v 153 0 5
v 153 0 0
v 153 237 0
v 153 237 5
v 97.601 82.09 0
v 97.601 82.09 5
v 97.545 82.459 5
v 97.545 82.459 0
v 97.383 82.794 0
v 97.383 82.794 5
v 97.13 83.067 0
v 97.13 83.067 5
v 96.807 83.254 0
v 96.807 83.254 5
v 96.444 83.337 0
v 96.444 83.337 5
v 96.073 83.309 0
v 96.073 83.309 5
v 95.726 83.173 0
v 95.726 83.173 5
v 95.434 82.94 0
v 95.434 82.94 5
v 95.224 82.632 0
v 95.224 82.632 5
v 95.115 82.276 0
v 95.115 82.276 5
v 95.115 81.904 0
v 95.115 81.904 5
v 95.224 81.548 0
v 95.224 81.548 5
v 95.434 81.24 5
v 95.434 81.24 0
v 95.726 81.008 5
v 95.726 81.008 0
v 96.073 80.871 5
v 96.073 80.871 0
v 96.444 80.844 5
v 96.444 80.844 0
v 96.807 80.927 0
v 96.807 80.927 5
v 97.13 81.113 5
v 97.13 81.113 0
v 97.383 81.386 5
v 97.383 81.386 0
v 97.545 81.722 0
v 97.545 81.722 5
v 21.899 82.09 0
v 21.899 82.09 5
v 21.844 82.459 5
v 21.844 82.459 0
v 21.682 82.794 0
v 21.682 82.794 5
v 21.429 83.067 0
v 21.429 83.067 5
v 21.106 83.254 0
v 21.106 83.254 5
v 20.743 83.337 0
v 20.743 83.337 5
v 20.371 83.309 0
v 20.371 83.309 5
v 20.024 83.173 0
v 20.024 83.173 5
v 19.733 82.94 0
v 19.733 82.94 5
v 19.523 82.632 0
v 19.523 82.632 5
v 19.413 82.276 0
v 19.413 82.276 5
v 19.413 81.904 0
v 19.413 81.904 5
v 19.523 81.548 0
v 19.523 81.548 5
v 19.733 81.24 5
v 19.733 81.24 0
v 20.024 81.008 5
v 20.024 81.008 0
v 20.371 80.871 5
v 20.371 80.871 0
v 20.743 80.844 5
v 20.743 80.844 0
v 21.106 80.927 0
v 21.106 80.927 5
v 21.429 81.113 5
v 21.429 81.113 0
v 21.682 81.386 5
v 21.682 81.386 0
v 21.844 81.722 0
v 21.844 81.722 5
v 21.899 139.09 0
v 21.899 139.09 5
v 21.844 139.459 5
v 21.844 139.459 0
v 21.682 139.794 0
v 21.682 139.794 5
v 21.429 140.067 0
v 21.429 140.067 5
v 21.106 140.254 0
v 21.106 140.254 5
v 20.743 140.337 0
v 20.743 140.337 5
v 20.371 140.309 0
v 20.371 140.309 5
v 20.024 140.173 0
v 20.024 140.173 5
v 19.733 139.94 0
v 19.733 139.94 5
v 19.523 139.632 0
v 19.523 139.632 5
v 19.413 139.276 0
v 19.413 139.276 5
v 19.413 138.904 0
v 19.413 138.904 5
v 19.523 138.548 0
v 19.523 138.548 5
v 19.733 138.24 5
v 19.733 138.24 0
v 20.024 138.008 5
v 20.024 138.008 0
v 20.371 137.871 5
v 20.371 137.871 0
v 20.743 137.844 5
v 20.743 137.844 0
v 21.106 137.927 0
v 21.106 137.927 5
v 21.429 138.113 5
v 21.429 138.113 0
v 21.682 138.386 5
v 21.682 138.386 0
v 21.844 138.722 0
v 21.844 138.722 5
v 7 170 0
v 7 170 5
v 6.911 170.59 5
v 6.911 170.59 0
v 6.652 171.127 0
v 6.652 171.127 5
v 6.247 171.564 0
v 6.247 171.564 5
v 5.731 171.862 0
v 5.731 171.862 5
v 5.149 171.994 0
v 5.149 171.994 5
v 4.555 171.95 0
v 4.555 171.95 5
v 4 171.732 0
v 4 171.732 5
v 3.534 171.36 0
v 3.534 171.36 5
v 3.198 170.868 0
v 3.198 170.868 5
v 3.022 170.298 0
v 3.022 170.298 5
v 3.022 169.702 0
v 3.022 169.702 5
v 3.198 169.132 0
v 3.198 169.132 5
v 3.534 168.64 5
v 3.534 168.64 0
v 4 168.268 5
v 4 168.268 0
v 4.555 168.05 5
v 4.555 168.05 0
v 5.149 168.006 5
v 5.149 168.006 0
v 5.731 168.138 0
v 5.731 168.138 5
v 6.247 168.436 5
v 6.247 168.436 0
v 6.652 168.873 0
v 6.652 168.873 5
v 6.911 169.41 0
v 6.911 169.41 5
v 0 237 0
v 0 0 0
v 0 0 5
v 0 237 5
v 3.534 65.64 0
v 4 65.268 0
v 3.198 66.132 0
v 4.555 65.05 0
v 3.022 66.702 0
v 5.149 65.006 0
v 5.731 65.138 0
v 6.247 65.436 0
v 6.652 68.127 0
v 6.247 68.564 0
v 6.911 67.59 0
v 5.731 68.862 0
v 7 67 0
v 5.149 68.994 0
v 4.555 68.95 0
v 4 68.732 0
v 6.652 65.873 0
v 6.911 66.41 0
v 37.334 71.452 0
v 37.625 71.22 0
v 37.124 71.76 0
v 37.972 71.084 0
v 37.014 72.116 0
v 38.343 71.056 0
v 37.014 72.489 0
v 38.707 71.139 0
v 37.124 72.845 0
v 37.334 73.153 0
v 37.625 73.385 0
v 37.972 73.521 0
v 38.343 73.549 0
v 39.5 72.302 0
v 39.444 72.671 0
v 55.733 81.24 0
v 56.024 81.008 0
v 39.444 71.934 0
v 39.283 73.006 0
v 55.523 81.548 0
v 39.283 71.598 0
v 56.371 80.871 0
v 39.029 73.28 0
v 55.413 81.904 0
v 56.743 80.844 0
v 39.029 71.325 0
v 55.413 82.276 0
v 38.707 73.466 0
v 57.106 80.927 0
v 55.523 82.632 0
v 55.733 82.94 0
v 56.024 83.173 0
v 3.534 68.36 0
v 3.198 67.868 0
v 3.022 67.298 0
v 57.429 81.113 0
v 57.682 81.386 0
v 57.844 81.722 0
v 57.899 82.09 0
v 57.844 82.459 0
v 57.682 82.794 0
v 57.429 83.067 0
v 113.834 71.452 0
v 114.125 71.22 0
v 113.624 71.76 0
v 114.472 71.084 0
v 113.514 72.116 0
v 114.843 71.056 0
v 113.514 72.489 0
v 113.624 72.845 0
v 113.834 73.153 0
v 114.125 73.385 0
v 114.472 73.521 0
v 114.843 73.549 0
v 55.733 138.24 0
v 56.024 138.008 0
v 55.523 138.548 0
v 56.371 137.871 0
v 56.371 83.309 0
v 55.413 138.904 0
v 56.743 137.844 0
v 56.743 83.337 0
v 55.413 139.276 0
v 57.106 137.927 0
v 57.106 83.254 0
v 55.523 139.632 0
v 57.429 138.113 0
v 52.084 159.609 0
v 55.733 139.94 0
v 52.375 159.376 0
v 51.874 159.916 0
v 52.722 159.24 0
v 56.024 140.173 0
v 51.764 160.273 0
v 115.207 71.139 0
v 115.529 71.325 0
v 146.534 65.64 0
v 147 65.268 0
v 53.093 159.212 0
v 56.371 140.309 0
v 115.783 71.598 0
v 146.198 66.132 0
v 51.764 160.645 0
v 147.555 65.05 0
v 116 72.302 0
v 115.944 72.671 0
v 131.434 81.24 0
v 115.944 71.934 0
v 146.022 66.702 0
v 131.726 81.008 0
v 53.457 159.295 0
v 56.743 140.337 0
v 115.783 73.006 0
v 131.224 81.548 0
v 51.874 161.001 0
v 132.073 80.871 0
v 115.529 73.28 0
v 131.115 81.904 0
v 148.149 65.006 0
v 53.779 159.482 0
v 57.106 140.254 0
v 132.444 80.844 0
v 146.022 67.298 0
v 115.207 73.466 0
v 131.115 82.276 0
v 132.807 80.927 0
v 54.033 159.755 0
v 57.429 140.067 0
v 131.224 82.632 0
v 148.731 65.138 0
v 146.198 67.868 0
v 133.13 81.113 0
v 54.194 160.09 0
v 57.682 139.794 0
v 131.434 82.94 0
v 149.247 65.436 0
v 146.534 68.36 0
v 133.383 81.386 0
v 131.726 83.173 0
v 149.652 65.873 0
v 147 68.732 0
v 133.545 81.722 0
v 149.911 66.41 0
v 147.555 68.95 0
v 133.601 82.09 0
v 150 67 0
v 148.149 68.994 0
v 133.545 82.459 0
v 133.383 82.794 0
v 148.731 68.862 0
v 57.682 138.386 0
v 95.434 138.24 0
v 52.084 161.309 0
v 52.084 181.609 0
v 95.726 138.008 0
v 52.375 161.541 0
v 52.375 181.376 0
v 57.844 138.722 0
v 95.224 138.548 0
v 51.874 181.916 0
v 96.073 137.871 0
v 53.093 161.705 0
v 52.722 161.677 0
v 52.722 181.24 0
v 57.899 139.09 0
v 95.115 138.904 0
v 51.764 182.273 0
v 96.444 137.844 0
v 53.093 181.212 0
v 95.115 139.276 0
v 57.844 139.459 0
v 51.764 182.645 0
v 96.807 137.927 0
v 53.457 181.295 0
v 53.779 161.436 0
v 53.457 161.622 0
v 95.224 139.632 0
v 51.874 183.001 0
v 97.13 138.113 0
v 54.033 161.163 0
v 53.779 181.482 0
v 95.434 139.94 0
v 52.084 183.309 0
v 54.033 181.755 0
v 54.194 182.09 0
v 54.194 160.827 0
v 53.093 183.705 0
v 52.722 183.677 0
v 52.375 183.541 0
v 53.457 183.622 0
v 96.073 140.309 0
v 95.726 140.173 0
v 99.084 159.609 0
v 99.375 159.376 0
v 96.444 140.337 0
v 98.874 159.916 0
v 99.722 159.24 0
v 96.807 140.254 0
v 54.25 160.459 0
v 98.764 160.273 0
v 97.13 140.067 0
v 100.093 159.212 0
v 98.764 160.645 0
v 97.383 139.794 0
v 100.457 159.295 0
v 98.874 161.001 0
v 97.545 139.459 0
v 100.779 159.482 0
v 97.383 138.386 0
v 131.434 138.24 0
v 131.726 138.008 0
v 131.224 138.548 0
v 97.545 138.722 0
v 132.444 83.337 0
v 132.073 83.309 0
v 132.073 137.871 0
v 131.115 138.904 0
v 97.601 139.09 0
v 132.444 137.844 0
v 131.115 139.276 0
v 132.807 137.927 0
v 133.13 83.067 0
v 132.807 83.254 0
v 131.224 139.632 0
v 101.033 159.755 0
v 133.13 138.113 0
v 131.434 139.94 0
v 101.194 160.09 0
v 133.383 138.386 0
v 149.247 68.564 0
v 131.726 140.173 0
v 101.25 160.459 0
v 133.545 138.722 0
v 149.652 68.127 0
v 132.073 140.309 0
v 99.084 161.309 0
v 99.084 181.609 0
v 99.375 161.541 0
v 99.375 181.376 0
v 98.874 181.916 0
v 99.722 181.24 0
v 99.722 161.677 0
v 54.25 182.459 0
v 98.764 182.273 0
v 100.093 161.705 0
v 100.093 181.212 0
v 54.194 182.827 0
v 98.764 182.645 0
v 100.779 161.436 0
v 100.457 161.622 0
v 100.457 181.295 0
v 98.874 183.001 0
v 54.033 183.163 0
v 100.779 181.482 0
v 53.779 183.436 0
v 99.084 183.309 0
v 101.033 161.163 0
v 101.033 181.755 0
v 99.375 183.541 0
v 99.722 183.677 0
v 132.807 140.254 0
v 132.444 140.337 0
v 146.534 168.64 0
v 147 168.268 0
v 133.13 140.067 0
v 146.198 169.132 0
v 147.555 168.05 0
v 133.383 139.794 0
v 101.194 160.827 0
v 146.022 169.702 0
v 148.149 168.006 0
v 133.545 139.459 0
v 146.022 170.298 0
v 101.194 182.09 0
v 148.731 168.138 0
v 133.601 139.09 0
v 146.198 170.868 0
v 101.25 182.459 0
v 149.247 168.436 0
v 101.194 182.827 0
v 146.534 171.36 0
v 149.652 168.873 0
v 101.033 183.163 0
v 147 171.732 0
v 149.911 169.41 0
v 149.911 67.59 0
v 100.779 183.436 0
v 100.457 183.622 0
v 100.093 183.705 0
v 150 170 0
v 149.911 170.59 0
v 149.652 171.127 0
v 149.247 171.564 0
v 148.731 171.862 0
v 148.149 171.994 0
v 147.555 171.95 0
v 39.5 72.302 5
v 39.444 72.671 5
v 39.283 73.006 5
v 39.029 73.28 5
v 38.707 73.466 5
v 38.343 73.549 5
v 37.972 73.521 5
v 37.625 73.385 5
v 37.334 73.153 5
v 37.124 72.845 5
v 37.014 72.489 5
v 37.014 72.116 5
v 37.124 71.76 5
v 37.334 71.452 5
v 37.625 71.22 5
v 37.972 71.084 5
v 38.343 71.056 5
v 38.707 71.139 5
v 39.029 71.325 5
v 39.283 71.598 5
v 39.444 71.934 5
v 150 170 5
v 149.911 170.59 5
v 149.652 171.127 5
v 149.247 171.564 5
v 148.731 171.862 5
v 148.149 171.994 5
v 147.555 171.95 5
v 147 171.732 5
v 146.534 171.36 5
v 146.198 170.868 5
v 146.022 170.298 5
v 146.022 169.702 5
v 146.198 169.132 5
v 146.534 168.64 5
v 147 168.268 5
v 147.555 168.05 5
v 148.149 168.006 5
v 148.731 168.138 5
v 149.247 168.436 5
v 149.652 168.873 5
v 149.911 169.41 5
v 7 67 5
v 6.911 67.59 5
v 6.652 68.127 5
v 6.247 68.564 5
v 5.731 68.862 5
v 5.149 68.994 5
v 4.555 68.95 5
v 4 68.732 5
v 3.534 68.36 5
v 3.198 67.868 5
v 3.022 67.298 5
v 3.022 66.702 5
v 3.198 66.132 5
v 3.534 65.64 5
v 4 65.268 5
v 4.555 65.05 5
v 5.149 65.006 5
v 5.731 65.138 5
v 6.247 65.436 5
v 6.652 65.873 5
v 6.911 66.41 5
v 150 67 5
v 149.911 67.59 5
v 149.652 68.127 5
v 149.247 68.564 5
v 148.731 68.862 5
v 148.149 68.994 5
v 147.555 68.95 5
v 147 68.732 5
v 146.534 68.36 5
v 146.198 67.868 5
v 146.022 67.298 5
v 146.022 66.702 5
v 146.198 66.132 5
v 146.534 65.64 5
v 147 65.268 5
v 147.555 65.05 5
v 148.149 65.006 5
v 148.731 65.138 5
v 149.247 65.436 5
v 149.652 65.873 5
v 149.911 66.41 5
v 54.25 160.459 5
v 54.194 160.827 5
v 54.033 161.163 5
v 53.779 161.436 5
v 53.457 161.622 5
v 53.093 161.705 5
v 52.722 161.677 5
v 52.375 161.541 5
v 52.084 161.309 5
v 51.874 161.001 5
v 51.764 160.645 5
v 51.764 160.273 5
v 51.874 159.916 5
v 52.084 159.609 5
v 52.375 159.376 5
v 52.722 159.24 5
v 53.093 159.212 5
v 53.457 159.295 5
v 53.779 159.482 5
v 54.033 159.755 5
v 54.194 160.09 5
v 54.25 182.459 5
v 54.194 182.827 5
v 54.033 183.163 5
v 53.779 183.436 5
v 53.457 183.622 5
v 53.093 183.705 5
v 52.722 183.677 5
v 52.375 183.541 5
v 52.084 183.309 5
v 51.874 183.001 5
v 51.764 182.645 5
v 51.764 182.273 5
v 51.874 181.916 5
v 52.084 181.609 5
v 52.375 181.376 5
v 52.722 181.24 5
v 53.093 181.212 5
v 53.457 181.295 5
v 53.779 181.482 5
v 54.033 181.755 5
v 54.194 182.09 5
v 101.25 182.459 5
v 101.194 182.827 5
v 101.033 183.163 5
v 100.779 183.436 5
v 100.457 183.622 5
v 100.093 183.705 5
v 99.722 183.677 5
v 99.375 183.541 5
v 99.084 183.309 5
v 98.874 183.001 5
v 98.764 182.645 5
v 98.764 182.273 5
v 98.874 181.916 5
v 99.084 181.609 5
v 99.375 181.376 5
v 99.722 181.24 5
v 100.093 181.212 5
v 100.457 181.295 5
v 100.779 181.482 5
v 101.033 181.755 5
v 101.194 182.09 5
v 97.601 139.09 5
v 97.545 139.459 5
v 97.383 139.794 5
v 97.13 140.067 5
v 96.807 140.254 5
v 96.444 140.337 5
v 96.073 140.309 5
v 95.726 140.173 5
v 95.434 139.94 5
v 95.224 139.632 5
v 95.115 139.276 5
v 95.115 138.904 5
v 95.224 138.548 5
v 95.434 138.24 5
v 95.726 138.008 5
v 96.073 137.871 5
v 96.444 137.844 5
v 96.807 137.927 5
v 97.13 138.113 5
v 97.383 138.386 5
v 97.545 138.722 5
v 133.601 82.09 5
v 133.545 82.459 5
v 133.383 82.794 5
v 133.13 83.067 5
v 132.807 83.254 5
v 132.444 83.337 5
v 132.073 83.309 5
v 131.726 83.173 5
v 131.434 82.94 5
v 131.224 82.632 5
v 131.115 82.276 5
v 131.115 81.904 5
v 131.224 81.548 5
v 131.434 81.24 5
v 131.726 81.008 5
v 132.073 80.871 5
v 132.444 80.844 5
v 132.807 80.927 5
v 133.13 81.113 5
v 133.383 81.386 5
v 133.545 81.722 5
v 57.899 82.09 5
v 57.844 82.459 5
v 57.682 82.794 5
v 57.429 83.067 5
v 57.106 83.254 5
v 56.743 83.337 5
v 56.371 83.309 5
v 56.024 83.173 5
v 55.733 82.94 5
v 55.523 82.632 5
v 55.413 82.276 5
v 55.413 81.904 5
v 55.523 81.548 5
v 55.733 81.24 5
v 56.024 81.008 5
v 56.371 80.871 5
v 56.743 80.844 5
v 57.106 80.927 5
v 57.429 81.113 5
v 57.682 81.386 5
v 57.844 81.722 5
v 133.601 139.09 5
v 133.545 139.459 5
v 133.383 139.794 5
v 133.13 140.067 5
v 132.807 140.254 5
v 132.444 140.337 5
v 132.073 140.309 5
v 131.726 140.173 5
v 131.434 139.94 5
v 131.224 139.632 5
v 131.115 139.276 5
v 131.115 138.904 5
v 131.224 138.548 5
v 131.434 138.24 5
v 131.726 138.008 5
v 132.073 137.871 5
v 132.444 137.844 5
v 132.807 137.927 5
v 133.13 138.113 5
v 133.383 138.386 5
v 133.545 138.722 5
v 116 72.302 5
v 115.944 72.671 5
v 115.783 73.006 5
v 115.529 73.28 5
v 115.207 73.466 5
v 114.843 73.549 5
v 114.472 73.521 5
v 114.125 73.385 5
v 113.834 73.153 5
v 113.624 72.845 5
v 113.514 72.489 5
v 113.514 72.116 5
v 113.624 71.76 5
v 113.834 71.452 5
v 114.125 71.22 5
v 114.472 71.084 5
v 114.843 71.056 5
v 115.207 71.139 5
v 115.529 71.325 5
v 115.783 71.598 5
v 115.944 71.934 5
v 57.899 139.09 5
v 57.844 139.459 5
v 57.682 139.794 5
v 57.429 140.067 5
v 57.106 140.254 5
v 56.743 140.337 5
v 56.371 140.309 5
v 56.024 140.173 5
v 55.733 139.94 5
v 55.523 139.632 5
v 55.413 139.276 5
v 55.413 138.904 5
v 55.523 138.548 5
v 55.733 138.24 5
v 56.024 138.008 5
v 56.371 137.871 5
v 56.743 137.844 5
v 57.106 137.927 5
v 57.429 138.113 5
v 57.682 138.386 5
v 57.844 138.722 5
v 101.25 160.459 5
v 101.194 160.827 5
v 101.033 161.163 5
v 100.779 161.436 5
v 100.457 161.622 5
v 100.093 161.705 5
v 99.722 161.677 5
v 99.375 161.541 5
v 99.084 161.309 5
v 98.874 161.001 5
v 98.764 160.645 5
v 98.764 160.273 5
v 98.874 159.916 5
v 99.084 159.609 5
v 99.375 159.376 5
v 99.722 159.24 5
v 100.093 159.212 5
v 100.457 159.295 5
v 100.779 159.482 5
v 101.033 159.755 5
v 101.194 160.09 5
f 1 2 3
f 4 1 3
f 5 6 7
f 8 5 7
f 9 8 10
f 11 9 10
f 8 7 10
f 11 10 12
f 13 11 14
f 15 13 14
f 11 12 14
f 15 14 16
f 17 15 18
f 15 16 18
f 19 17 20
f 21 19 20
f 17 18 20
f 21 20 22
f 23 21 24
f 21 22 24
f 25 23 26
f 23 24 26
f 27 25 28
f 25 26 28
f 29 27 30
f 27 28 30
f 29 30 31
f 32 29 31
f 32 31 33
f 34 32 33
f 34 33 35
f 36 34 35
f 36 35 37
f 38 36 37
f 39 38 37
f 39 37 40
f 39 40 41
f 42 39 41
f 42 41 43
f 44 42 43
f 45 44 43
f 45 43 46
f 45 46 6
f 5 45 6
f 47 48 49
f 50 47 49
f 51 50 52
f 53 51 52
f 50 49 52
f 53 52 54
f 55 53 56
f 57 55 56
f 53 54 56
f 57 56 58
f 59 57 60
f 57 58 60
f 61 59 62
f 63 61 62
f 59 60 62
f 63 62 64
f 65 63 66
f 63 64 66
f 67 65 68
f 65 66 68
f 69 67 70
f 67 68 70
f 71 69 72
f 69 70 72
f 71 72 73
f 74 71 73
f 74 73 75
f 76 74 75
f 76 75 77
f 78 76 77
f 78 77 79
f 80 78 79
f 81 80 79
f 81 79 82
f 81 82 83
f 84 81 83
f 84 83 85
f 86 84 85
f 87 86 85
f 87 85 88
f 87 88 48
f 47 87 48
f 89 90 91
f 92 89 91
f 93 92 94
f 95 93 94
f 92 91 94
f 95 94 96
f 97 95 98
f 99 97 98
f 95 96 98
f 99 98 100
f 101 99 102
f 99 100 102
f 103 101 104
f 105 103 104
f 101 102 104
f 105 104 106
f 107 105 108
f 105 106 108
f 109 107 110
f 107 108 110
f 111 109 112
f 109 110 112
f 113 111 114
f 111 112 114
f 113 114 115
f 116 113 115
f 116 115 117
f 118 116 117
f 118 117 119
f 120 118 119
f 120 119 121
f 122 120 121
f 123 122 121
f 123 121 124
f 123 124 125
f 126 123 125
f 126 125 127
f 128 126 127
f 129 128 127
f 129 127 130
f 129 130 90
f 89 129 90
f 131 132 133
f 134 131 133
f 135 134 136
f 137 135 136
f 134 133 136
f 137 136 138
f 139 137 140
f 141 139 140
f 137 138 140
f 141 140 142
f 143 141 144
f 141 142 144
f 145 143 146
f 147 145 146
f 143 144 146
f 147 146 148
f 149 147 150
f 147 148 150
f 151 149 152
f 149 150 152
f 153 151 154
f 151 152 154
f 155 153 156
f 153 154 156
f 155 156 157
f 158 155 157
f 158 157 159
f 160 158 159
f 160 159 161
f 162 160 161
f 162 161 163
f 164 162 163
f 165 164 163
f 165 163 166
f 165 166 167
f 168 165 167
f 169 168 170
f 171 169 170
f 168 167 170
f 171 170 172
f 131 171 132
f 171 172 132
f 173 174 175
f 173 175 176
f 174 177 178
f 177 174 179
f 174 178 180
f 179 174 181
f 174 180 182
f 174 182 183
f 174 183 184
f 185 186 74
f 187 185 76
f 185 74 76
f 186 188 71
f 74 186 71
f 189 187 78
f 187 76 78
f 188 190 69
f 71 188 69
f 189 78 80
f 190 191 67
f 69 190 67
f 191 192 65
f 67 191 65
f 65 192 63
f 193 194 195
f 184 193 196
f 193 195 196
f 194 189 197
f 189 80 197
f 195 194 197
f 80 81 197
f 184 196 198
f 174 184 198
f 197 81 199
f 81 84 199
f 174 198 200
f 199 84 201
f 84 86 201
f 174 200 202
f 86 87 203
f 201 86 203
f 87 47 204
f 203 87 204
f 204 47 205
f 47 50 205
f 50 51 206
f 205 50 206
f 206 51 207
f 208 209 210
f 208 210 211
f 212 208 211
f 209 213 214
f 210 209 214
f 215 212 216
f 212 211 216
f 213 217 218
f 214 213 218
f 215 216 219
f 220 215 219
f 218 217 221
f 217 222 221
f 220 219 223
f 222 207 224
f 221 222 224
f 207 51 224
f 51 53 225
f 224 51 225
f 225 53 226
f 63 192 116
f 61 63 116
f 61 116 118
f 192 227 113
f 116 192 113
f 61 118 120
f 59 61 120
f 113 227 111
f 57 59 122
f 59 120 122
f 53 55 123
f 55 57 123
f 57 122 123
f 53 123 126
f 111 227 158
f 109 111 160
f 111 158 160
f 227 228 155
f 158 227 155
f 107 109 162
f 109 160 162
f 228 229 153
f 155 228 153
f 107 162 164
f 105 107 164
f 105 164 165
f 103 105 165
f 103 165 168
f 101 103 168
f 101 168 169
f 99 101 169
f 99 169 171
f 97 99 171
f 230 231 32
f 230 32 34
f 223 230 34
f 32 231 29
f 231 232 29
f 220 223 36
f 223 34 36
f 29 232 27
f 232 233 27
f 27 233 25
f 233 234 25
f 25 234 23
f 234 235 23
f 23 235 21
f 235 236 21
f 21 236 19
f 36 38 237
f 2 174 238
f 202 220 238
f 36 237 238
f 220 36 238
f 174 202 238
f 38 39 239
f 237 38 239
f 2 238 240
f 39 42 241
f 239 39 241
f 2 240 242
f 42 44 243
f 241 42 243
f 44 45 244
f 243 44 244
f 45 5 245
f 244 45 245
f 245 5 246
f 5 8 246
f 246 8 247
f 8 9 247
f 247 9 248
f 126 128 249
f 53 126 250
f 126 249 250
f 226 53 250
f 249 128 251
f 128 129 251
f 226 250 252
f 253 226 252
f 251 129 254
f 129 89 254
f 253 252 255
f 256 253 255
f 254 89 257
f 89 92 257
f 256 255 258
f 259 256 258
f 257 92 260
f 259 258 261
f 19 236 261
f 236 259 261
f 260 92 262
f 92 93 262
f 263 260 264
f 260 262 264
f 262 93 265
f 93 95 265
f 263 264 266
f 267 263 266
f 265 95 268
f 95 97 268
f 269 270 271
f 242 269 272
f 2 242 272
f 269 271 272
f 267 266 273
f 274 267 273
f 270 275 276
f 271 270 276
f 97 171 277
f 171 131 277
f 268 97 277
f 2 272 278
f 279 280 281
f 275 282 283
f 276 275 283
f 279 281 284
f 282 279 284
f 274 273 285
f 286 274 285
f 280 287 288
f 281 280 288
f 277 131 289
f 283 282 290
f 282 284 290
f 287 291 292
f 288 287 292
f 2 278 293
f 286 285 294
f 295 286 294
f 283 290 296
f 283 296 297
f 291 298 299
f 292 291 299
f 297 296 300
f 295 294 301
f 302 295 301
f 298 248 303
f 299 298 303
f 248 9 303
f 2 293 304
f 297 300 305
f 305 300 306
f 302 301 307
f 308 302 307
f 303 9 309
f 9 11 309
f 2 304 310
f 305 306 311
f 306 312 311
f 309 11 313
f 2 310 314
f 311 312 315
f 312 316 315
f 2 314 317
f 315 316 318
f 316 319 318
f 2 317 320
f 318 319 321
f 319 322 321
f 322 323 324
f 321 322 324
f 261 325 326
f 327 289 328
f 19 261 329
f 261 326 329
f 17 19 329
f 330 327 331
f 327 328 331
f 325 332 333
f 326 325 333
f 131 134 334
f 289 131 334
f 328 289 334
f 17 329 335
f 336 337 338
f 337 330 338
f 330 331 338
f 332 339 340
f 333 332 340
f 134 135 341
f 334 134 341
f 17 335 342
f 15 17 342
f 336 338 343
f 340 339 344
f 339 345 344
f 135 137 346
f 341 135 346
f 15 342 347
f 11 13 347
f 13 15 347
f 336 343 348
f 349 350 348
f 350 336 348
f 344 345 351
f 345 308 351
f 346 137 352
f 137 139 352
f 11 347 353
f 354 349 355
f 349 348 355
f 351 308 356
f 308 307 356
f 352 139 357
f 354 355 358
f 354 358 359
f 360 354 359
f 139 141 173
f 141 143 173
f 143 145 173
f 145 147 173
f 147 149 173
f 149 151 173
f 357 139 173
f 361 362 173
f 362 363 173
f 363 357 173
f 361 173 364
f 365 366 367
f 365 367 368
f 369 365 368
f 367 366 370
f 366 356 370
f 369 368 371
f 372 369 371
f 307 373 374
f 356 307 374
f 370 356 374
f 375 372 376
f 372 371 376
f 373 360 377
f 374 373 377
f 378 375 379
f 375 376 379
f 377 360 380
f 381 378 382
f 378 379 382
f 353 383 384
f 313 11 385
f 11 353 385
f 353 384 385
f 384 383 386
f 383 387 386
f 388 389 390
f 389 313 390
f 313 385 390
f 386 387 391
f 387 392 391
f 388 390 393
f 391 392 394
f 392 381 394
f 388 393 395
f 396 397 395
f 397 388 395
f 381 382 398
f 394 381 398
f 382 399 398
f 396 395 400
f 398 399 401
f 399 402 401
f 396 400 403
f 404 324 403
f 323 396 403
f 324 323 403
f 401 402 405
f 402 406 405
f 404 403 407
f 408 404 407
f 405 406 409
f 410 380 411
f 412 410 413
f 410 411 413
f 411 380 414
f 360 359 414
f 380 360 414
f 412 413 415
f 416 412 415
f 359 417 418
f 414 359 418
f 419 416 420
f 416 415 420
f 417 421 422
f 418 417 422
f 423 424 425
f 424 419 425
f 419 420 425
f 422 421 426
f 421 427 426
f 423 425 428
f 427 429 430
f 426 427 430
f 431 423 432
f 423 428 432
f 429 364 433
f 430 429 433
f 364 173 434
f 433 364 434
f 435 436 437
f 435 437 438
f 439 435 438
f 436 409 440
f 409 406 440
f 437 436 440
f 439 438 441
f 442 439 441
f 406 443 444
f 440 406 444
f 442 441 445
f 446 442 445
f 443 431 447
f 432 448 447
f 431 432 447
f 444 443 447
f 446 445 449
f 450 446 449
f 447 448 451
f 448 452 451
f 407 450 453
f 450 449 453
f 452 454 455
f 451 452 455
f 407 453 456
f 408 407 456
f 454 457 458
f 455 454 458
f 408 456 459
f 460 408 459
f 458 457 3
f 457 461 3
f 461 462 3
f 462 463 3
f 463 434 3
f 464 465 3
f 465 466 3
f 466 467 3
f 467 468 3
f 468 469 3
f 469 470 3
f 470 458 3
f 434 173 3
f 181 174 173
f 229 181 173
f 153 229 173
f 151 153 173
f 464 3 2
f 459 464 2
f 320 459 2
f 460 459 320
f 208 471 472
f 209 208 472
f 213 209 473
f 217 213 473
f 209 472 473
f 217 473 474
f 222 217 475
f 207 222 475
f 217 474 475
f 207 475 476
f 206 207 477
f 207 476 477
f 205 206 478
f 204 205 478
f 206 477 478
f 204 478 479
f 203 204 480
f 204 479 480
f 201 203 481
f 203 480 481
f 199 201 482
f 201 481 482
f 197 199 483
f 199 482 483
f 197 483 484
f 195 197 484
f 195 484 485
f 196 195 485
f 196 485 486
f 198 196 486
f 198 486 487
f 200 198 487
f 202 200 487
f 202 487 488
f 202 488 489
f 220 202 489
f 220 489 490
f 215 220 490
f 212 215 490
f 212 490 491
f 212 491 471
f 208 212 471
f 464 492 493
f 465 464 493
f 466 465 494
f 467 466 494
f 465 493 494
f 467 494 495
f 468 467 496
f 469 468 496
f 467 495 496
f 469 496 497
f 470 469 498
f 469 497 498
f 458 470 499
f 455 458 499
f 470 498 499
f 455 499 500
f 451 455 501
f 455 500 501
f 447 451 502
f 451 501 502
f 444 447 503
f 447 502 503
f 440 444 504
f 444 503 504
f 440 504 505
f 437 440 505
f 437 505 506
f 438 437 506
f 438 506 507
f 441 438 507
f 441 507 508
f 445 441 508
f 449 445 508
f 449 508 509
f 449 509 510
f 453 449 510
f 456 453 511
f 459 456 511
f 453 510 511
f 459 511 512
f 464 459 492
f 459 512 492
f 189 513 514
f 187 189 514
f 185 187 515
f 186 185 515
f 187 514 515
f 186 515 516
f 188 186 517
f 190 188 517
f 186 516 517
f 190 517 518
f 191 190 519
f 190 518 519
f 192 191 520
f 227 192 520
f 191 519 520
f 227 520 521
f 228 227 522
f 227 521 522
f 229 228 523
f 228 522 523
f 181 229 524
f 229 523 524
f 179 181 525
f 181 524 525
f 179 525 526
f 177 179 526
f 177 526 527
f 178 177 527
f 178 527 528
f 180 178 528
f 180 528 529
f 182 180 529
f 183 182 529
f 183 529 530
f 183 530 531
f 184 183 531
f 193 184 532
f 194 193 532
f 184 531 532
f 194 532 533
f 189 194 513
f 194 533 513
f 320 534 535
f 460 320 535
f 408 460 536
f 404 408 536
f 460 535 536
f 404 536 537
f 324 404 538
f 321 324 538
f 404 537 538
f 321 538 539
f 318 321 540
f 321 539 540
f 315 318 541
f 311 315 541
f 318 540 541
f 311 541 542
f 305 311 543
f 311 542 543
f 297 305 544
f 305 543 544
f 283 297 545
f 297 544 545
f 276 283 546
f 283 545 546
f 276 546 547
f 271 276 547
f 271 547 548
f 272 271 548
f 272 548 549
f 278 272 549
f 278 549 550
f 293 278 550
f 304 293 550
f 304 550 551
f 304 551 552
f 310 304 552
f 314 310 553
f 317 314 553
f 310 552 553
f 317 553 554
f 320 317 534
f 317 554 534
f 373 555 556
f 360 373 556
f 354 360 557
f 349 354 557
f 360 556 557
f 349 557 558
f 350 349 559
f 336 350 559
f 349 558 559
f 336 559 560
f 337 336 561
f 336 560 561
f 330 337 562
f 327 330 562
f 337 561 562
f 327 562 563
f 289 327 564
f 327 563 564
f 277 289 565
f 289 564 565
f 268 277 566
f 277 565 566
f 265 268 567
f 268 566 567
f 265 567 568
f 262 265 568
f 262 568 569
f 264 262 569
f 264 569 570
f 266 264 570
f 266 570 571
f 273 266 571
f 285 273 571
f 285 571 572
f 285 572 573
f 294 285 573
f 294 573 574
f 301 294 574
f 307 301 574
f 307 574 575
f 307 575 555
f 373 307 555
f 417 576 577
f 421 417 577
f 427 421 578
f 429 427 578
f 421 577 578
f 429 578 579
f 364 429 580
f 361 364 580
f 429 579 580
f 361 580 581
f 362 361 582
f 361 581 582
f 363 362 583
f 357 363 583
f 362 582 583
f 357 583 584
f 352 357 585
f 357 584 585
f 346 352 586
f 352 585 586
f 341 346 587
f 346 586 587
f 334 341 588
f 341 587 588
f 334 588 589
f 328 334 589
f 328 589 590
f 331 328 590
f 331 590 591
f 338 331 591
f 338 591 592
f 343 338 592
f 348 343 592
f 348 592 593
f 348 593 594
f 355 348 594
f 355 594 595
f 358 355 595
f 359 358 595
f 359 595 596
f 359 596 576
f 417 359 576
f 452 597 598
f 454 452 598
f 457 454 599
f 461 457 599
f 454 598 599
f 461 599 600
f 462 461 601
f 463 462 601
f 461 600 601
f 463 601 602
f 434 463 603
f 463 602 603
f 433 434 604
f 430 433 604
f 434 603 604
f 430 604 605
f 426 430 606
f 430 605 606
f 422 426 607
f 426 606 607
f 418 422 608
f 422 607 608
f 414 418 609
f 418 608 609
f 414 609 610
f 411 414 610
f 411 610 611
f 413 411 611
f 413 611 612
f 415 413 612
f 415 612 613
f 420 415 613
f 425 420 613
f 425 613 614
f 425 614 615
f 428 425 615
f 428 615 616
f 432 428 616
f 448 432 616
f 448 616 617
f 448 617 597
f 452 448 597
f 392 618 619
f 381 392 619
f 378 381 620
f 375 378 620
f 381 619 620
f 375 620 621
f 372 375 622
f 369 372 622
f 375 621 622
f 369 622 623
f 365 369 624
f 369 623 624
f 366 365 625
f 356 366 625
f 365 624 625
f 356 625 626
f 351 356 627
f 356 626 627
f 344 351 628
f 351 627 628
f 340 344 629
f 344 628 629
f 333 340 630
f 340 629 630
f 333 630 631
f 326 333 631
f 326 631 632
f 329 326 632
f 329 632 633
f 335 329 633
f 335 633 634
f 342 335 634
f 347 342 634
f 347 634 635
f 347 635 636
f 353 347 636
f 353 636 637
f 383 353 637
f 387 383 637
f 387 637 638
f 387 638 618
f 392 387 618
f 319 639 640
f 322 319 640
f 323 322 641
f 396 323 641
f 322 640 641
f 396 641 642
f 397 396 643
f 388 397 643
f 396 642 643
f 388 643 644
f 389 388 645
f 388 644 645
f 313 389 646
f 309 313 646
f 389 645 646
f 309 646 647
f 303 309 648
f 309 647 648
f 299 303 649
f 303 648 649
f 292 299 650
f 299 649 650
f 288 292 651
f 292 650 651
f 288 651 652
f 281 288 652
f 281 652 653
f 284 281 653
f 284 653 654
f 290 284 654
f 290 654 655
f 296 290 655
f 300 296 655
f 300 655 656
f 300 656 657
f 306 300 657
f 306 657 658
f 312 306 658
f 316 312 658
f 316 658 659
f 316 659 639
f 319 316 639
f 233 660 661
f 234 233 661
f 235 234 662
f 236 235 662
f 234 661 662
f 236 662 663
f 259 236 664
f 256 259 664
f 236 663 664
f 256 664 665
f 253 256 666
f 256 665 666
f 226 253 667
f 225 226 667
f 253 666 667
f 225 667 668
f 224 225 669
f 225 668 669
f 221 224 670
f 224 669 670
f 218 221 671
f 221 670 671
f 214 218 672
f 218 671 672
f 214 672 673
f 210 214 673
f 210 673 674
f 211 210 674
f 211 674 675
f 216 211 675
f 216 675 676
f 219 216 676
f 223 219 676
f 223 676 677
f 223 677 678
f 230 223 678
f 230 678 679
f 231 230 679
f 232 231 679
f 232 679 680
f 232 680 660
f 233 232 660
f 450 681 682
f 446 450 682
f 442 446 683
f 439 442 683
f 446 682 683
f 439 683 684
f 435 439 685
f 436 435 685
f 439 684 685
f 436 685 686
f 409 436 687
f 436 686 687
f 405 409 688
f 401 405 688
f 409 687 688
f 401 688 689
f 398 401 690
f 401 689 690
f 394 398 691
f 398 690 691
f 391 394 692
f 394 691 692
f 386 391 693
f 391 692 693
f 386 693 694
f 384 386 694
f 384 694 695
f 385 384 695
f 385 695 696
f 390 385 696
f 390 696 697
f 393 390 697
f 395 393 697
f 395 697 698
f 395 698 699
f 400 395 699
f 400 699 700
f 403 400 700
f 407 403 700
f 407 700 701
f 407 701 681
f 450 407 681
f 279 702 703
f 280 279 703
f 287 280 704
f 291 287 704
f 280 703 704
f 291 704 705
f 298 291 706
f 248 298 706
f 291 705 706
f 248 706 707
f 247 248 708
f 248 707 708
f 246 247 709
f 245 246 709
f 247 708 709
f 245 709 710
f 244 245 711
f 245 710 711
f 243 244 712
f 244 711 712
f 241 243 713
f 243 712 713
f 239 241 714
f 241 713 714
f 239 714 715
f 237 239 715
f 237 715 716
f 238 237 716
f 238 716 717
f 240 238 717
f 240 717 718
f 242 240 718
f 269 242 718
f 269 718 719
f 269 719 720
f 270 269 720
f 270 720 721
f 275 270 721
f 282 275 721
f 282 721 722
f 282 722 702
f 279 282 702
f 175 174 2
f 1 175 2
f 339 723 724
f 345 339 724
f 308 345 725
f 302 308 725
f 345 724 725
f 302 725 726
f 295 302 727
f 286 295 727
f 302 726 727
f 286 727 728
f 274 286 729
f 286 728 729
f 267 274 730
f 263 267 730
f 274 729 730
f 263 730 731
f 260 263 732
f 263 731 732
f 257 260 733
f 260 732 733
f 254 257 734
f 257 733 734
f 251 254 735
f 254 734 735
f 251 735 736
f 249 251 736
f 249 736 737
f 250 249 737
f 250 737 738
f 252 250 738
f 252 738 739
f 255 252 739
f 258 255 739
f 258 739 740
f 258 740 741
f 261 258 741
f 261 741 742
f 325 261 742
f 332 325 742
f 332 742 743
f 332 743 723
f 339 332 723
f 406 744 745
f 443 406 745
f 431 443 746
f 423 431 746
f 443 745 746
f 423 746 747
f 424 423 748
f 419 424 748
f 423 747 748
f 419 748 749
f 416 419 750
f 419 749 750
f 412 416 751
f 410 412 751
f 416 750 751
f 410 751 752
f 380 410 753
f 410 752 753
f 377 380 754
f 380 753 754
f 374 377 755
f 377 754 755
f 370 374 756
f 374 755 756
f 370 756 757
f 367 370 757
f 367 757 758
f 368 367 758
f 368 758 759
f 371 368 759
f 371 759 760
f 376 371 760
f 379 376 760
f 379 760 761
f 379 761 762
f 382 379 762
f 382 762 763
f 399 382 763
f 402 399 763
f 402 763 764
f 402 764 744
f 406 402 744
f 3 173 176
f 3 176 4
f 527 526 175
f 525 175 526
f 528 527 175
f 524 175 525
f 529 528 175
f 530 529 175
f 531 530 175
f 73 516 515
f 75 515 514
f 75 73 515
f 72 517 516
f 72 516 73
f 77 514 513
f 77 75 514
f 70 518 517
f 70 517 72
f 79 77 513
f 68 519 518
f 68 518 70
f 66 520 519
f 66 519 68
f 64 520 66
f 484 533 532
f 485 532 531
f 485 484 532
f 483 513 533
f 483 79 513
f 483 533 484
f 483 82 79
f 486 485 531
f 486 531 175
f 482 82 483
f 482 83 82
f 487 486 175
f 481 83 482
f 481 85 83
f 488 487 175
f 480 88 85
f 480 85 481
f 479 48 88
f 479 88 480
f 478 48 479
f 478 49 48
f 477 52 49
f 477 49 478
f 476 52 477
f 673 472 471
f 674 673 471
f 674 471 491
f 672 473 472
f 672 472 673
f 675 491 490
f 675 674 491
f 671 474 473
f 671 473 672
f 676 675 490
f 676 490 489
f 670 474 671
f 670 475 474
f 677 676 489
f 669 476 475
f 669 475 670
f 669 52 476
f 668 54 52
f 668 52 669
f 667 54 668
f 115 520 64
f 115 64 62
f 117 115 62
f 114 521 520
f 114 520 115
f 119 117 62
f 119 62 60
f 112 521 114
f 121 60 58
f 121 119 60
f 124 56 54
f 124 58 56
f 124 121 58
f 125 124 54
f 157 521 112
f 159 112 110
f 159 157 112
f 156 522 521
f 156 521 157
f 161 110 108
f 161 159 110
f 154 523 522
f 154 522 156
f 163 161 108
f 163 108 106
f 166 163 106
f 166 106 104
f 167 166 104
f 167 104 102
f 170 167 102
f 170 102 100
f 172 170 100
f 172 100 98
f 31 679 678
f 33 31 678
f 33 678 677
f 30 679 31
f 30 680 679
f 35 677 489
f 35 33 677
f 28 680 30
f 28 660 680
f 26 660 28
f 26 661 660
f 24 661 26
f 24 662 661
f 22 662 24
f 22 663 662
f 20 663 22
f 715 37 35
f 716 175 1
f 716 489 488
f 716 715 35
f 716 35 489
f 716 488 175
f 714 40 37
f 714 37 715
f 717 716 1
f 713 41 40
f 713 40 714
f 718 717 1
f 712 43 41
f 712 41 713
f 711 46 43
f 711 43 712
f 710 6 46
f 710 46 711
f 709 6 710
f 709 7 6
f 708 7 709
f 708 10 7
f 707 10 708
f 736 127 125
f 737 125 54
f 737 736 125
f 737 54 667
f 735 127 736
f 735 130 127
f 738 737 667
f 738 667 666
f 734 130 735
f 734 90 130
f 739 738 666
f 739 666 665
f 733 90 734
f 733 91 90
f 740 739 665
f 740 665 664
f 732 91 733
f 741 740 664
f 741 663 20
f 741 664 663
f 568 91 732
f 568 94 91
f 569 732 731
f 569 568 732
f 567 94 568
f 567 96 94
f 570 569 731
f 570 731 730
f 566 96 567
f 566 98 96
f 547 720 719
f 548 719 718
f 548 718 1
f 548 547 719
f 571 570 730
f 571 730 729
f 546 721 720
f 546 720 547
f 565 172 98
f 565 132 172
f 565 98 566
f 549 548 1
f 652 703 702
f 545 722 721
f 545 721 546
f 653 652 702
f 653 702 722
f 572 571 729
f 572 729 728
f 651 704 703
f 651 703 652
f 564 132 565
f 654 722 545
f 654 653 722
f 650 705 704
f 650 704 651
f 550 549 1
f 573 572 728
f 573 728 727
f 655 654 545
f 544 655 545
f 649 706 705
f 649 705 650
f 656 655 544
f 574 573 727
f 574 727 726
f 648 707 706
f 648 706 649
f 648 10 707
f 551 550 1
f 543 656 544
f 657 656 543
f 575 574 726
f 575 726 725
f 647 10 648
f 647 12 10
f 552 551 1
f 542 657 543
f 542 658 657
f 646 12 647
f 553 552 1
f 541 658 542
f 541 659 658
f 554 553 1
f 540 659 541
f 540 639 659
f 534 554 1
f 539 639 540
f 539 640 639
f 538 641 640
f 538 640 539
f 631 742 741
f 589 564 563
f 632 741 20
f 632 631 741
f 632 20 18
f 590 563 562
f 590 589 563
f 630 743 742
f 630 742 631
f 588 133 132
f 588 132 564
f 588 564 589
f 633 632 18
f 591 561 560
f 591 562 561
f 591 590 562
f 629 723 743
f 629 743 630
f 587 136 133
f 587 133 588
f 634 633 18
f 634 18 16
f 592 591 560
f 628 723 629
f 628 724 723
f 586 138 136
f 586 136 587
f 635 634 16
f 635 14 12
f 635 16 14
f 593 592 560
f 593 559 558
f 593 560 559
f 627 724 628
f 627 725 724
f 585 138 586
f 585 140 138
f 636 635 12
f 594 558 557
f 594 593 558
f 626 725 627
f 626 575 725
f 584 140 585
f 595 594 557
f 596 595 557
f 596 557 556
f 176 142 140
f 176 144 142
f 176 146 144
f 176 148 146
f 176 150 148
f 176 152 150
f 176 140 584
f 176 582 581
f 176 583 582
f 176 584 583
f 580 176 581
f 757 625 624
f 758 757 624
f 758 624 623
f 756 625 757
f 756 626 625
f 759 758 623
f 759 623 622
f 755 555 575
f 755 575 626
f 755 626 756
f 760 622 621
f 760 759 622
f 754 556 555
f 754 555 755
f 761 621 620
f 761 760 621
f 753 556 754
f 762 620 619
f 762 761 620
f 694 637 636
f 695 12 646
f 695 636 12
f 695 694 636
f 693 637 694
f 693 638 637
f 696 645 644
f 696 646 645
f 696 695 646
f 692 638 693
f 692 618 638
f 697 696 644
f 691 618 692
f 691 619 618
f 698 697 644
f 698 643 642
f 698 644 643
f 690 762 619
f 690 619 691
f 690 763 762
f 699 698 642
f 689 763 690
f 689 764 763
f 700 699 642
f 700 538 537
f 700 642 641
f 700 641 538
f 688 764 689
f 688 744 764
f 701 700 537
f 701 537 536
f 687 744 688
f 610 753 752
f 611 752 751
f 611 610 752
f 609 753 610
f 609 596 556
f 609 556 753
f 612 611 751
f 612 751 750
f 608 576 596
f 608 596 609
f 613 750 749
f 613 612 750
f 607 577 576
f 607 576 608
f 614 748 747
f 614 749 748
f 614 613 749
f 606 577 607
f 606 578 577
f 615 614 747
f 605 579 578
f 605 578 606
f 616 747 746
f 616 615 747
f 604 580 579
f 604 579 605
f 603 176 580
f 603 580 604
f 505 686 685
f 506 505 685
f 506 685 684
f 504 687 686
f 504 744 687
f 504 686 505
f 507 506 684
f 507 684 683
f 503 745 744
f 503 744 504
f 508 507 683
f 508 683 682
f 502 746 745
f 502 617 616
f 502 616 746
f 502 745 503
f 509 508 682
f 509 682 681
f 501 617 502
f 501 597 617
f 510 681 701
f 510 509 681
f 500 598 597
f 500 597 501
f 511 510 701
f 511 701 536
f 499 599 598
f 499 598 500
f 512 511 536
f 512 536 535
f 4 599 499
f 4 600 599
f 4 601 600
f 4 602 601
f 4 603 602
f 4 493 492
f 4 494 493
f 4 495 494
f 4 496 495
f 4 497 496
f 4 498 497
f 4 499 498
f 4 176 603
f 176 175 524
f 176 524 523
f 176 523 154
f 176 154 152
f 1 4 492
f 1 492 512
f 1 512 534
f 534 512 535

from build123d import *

# Parameters (mm, degrees)
CROQUIS1_W              = 153
CROQUIS1_H              = 237
SALIENTE_EXTRUIR1_DEPTH = 5
CROQUIS2_R              = 2
CORTAR_EXTRUIR1_DEPTH   = 5
CROQUIS3_R              = 1.25
CORTAR_EXTRUIR2_DEPTH   = 10
CROQUIS4_R              = 1.25
CORTAR_EXTRUIR3_DEPTH   = 10


with BuildPart() as part:
    # Croquis1 → Saliente-Extruir1 (new body)
    with BuildSketch(Plane.XY):
        with Locations((76.5, 118.5)):
            Rectangle(CROQUIS1_W, CROQUIS1_H)
    extrude(amount=SALIENTE_EXTRUIR1_DEPTH)

    # Croquis2 → Cortar-Extruir1 (cut)
    with BuildSketch(Plane.XY.offset(5)):
        with Locations((5, 170)):
            Circle(CROQUIS2_R)
        with Locations((148, 170)):
            Circle(CROQUIS2_R)
        with Locations((5, 67)):
            Circle(CROQUIS2_R)
        with Locations((148, 67)):
            Circle(CROQUIS2_R)
    extrude(amount=-CORTAR_EXTRUIR1_DEPTH, mode=Mode.SUBTRACT)

    # Croquis3 → Cortar-Extruir2 (cut)
    with BuildSketch(Plane.XY.offset(5)):
        with Locations((20.649331187, 139.09012035)):
            Circle(CROQUIS3_R)
        with Locations((56.649331187, 139.09012035)):
            Circle(CROQUIS3_R)
        with Locations((56.649331187, 82.09012035)):
            Circle(CROQUIS3_R)
        with Locations((20.649331187, 82.09012035)):
            Circle(CROQUIS3_R)
        with Locations((114.75, 72.302318418)):
            Circle(CROQUIS3_R)
        with Locations((38.25, 72.302318418)):
            Circle(CROQUIS3_R)
        with Locations((132.350668813, 82.09012035)):
            Circle(CROQUIS3_R)
        with Locations((96.350668813, 82.09012035)):
            Circle(CROQUIS3_R)
        with Locations((96.350668813, 139.09012035)):
            Circle(CROQUIS3_R)
        with Locations((132.350668813, 139.09012035)):
            Circle(CROQUIS3_R)
    extrude(amount=-CORTAR_EXTRUIR2_DEPTH, mode=Mode.SUBTRACT)

    # Croquis4 → Cortar-Extruir3 (cut)
    with BuildSketch(Plane.XY.offset(5)):
        with Locations((53, 182.458833487)):
            Circle(CROQUIS4_R)
        with Locations((53, 160.458833487)):
            Circle(CROQUIS4_R)
        with Locations((100, 182.458833487)):
            Circle(CROQUIS4_R)
        with Locations((100, 160.458833487)):
            Circle(CROQUIS4_R)
    extrude(amount=-CORTAR_EXTRUIR3_DEPTH, mode=Mode.SUBTRACT)


solid = part.part
